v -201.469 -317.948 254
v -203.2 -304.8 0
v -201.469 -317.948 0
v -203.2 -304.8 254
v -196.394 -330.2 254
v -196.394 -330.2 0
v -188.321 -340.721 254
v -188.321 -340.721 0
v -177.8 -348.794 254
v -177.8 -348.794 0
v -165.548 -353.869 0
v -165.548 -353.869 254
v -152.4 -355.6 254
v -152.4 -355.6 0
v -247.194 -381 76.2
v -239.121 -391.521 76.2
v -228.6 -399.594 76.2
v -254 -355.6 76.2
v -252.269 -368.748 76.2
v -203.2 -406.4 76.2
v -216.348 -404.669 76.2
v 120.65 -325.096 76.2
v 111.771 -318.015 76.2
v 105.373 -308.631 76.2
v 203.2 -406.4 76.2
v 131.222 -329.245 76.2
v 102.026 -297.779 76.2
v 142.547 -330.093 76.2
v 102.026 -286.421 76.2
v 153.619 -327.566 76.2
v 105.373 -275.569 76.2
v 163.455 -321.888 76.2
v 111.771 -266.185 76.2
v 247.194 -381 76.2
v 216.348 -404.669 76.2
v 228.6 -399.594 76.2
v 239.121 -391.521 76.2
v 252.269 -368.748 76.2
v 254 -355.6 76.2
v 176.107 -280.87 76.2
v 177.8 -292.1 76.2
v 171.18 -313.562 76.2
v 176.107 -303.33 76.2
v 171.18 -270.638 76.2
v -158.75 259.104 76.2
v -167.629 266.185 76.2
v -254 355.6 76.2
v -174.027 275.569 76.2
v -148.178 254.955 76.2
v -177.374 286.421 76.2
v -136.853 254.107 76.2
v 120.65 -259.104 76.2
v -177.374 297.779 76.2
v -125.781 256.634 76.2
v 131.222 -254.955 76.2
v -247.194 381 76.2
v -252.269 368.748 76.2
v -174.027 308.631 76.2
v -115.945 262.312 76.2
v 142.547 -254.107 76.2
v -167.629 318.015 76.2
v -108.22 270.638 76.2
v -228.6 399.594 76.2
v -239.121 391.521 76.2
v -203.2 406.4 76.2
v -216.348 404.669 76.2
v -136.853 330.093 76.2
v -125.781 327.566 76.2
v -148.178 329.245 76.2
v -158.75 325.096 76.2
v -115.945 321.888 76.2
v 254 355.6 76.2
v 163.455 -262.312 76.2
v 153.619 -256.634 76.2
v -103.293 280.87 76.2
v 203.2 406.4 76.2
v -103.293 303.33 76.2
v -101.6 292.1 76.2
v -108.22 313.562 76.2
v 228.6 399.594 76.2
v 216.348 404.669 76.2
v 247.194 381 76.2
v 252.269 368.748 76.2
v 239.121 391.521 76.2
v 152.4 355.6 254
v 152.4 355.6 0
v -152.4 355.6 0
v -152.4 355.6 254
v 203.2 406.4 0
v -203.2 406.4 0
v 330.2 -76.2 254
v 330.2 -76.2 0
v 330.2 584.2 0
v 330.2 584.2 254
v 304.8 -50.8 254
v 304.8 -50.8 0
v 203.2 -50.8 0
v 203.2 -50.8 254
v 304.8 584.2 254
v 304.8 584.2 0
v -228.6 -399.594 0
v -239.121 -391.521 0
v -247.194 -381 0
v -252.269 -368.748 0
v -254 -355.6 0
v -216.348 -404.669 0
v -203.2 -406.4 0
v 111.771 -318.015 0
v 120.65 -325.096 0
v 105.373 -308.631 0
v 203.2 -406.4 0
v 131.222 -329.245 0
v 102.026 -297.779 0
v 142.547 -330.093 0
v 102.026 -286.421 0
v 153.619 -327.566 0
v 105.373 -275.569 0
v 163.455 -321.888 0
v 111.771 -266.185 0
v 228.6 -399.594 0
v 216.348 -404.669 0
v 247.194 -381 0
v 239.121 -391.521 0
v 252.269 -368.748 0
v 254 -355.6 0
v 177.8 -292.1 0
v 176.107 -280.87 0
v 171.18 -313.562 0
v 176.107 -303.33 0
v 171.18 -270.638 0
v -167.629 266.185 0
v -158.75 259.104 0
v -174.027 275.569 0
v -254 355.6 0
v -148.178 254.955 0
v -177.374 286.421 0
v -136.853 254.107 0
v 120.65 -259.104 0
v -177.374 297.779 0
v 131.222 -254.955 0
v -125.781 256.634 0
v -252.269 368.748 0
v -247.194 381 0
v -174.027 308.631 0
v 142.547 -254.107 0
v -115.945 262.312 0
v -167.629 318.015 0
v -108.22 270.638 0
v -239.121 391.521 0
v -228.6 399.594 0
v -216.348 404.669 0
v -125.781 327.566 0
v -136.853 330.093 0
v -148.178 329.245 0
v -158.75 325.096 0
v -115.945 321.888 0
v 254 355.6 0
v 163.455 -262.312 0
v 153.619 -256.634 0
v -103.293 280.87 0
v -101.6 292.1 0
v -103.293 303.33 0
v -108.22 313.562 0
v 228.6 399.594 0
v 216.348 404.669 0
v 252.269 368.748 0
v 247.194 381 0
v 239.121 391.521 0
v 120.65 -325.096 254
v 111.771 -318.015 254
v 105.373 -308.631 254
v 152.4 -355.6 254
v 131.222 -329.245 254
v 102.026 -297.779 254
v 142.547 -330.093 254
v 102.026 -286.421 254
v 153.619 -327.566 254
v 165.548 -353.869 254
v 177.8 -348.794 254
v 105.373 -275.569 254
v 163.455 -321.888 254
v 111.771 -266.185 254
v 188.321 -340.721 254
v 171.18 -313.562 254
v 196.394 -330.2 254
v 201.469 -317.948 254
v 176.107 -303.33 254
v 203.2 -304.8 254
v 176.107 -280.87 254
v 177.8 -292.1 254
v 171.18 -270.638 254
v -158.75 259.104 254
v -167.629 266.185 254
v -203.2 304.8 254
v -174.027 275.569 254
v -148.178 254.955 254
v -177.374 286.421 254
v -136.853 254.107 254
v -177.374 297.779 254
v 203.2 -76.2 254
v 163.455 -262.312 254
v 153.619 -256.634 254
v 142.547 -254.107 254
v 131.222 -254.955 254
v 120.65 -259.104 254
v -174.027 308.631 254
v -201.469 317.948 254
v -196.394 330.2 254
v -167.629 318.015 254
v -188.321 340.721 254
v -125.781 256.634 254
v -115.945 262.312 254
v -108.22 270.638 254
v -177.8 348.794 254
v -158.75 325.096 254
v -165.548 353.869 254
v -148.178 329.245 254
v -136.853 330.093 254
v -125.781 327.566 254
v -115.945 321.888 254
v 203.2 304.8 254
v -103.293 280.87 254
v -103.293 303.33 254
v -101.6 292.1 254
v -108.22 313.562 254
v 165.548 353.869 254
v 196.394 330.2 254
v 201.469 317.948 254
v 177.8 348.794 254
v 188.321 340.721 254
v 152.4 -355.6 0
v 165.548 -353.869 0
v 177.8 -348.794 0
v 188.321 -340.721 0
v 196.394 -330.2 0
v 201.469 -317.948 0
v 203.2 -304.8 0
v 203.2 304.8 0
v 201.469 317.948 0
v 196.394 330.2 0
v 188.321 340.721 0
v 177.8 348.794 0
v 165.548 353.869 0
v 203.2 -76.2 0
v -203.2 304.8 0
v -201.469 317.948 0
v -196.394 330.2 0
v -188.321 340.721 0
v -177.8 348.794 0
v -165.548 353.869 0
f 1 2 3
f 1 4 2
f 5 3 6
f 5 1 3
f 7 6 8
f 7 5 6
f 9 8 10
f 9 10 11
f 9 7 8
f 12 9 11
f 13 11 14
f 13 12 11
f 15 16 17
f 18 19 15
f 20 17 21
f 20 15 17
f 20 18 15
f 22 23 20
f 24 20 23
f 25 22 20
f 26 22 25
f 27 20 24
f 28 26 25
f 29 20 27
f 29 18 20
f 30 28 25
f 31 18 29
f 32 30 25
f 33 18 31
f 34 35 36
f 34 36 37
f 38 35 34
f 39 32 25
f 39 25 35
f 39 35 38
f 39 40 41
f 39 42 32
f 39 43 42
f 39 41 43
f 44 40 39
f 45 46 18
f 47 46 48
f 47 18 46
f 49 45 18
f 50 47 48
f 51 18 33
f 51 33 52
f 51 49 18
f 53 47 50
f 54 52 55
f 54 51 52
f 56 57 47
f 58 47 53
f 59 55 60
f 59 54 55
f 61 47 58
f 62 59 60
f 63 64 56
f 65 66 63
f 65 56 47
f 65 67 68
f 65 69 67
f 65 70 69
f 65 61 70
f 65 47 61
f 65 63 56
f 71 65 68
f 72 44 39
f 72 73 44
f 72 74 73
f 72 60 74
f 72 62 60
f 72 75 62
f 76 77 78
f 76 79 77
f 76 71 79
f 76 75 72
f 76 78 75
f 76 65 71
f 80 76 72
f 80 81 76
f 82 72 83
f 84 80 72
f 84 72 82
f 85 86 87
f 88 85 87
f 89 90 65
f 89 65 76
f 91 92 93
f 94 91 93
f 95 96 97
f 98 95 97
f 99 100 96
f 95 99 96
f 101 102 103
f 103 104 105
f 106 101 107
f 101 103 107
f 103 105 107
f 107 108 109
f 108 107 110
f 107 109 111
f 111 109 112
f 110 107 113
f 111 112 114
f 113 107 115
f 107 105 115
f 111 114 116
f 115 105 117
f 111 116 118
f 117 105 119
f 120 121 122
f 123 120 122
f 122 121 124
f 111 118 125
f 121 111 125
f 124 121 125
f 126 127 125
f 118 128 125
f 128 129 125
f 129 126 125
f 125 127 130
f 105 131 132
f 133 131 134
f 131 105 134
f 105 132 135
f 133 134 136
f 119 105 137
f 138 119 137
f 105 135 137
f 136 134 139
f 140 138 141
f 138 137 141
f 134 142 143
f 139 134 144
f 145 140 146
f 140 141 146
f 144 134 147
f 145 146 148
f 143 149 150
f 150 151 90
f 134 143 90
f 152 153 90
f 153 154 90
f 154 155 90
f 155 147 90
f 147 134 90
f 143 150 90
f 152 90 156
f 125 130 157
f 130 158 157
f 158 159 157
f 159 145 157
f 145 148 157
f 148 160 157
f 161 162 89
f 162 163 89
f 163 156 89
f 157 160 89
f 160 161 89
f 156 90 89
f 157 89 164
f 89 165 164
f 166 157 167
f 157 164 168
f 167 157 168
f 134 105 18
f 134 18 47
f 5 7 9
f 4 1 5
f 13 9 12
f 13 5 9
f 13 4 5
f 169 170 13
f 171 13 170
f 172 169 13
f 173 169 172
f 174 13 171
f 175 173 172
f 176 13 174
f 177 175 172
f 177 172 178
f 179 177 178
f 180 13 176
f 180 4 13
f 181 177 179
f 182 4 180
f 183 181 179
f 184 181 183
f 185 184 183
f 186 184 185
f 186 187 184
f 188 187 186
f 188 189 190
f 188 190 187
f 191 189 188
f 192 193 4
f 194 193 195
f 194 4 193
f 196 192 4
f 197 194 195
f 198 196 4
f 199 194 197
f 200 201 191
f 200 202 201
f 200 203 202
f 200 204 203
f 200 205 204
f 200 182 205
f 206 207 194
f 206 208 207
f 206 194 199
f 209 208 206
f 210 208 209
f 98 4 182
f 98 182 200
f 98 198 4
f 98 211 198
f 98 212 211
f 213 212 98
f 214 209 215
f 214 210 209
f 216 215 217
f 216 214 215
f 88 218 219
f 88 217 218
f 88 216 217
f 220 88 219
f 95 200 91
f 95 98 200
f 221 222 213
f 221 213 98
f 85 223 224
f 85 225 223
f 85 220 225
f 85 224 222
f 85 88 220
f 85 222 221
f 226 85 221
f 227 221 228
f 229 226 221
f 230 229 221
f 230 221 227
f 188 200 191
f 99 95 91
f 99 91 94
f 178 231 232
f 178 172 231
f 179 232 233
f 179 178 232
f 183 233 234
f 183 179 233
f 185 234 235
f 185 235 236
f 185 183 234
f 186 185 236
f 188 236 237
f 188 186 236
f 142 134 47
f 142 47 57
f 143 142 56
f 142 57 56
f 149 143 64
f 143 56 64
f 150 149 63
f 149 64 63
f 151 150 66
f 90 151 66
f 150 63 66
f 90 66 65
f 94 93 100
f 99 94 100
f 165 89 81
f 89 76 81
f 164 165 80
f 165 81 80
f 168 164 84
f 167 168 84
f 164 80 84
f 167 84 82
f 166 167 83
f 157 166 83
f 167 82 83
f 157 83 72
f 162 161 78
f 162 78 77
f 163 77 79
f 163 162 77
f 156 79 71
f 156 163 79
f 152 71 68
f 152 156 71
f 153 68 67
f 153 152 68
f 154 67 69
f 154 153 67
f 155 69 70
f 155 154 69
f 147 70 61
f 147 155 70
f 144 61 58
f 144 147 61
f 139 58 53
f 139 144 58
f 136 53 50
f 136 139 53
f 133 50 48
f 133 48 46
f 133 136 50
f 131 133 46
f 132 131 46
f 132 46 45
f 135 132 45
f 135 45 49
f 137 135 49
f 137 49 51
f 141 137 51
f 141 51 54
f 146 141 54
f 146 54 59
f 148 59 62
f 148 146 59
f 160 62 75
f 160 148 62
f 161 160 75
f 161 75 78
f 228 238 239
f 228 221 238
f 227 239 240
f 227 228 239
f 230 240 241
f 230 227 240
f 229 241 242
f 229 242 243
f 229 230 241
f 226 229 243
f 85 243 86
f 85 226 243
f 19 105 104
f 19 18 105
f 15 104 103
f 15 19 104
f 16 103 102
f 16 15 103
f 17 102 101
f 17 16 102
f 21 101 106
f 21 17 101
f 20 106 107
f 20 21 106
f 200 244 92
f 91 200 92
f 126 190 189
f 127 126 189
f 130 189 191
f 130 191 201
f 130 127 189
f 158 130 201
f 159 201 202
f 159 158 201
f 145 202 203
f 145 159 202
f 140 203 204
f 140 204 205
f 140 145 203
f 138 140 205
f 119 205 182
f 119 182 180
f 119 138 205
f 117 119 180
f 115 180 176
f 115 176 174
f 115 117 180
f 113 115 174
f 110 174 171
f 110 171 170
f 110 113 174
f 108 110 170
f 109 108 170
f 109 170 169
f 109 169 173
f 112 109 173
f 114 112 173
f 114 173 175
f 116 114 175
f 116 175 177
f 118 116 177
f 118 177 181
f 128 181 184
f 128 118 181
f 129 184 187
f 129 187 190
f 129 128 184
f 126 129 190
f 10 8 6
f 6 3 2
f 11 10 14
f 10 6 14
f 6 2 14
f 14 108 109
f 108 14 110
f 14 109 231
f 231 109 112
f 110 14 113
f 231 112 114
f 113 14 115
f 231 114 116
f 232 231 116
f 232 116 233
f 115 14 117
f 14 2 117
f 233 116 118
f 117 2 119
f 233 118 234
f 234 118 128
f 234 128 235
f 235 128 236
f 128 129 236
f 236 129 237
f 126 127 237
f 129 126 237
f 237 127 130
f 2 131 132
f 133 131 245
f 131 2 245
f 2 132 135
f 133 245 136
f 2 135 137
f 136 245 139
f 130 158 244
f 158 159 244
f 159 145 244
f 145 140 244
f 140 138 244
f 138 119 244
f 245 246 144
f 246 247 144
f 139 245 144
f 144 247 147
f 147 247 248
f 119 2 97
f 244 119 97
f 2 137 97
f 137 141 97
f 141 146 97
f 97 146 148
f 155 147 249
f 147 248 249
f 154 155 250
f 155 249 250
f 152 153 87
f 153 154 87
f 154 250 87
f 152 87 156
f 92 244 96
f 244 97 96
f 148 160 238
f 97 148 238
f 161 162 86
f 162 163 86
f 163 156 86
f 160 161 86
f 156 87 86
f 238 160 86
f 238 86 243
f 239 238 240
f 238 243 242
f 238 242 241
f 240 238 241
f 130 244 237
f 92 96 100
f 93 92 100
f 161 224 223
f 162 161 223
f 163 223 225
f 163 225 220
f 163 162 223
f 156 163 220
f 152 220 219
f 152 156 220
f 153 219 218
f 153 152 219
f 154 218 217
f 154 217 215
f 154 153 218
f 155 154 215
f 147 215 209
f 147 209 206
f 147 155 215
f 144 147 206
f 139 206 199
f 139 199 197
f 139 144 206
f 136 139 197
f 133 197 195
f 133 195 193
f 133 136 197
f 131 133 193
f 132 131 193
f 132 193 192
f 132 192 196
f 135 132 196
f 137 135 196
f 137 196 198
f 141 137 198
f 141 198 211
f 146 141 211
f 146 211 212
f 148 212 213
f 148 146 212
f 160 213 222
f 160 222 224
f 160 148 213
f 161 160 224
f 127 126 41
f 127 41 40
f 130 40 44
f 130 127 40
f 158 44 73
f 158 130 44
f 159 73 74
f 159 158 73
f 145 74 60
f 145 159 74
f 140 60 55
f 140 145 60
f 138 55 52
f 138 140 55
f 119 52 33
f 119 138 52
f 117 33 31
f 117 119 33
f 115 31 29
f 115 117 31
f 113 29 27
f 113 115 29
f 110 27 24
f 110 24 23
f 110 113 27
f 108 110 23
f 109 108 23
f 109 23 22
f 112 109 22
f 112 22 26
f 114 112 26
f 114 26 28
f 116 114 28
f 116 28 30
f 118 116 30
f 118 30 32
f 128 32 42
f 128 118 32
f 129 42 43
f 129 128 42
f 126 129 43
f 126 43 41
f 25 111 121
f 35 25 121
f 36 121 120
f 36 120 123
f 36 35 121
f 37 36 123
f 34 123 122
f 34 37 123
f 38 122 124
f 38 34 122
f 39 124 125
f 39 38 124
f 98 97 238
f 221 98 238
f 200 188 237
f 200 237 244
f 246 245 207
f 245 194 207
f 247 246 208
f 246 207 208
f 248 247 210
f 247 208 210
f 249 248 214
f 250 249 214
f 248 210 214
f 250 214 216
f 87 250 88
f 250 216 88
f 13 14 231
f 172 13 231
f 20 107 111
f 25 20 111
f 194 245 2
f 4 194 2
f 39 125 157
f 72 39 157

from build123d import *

# Parameters (mm, degrees)
F0_R     = 38.1
F1_DEPTH = 254
F2_R     = 50.8
F3_W     = 508
F3_H     = 812.8
F3_R     = 38.1
F4_DEPTH = 76.2
F5_R     = 50.8


with BuildPart() as f1:
    # F0 (on Top) → F1 (new body)
    with BuildSketch(Plane.XY):
        Polygon((-203.2, 355.6), (-203.2, -355.6), (203.2, -355.6), (203.2, -76.2), (203.2, -50.8), (203.2, 355.6), align=None)
        with Locations((139.7, -292.1)):
            Circle(F0_R, mode=Mode.SUBTRACT)
        with Locations((-139.7, 292.1)):
            Circle(F0_R, mode=Mode.SUBTRACT)
        Polygon((203.2, -50.8), (203.2, -76.2), (330.2, -76.2), (330.2, 584.2), (304.8, 584.2), (304.8, -50.8), align=None)
    extrude(amount=F1_DEPTH)

    # F2
    f2_edges = [f1.edges().sort_by_distance(p)[0] for p in [
        (-203.2, 355.6, 127),
        (203.2, 355.6, 127),
        (-203.2, -355.6, 127),
        (203.2, -355.6, 127),
    ]]
    fillet(f2_edges, radius=F2_R)


with BuildPart() as f4:
    # F3 (on Top) → F4 (new body)
    with BuildSketch(Plane.XY):
        Rectangle(F3_W, F3_H)
        with Locations((139.7, -292.1)):
            Circle(F3_R, mode=Mode.SUBTRACT)
        with Locations((-139.7, 292.1)):
            Circle(F3_R, mode=Mode.SUBTRACT)
    extrude(amount=F4_DEPTH)

    # F5
    f5_edges = [f4.edges().sort_by_distance(p)[0] for p in [
        (254, -406.4, 38.1),
        (-254, -406.4, 38.1),
        (-254, 406.4, 38.1),
        (254, 406.4, 38.1),
    ]]
    fillet(f5_edges, radius=F5_R)


solid = Compound([f1.part, f4.part])
